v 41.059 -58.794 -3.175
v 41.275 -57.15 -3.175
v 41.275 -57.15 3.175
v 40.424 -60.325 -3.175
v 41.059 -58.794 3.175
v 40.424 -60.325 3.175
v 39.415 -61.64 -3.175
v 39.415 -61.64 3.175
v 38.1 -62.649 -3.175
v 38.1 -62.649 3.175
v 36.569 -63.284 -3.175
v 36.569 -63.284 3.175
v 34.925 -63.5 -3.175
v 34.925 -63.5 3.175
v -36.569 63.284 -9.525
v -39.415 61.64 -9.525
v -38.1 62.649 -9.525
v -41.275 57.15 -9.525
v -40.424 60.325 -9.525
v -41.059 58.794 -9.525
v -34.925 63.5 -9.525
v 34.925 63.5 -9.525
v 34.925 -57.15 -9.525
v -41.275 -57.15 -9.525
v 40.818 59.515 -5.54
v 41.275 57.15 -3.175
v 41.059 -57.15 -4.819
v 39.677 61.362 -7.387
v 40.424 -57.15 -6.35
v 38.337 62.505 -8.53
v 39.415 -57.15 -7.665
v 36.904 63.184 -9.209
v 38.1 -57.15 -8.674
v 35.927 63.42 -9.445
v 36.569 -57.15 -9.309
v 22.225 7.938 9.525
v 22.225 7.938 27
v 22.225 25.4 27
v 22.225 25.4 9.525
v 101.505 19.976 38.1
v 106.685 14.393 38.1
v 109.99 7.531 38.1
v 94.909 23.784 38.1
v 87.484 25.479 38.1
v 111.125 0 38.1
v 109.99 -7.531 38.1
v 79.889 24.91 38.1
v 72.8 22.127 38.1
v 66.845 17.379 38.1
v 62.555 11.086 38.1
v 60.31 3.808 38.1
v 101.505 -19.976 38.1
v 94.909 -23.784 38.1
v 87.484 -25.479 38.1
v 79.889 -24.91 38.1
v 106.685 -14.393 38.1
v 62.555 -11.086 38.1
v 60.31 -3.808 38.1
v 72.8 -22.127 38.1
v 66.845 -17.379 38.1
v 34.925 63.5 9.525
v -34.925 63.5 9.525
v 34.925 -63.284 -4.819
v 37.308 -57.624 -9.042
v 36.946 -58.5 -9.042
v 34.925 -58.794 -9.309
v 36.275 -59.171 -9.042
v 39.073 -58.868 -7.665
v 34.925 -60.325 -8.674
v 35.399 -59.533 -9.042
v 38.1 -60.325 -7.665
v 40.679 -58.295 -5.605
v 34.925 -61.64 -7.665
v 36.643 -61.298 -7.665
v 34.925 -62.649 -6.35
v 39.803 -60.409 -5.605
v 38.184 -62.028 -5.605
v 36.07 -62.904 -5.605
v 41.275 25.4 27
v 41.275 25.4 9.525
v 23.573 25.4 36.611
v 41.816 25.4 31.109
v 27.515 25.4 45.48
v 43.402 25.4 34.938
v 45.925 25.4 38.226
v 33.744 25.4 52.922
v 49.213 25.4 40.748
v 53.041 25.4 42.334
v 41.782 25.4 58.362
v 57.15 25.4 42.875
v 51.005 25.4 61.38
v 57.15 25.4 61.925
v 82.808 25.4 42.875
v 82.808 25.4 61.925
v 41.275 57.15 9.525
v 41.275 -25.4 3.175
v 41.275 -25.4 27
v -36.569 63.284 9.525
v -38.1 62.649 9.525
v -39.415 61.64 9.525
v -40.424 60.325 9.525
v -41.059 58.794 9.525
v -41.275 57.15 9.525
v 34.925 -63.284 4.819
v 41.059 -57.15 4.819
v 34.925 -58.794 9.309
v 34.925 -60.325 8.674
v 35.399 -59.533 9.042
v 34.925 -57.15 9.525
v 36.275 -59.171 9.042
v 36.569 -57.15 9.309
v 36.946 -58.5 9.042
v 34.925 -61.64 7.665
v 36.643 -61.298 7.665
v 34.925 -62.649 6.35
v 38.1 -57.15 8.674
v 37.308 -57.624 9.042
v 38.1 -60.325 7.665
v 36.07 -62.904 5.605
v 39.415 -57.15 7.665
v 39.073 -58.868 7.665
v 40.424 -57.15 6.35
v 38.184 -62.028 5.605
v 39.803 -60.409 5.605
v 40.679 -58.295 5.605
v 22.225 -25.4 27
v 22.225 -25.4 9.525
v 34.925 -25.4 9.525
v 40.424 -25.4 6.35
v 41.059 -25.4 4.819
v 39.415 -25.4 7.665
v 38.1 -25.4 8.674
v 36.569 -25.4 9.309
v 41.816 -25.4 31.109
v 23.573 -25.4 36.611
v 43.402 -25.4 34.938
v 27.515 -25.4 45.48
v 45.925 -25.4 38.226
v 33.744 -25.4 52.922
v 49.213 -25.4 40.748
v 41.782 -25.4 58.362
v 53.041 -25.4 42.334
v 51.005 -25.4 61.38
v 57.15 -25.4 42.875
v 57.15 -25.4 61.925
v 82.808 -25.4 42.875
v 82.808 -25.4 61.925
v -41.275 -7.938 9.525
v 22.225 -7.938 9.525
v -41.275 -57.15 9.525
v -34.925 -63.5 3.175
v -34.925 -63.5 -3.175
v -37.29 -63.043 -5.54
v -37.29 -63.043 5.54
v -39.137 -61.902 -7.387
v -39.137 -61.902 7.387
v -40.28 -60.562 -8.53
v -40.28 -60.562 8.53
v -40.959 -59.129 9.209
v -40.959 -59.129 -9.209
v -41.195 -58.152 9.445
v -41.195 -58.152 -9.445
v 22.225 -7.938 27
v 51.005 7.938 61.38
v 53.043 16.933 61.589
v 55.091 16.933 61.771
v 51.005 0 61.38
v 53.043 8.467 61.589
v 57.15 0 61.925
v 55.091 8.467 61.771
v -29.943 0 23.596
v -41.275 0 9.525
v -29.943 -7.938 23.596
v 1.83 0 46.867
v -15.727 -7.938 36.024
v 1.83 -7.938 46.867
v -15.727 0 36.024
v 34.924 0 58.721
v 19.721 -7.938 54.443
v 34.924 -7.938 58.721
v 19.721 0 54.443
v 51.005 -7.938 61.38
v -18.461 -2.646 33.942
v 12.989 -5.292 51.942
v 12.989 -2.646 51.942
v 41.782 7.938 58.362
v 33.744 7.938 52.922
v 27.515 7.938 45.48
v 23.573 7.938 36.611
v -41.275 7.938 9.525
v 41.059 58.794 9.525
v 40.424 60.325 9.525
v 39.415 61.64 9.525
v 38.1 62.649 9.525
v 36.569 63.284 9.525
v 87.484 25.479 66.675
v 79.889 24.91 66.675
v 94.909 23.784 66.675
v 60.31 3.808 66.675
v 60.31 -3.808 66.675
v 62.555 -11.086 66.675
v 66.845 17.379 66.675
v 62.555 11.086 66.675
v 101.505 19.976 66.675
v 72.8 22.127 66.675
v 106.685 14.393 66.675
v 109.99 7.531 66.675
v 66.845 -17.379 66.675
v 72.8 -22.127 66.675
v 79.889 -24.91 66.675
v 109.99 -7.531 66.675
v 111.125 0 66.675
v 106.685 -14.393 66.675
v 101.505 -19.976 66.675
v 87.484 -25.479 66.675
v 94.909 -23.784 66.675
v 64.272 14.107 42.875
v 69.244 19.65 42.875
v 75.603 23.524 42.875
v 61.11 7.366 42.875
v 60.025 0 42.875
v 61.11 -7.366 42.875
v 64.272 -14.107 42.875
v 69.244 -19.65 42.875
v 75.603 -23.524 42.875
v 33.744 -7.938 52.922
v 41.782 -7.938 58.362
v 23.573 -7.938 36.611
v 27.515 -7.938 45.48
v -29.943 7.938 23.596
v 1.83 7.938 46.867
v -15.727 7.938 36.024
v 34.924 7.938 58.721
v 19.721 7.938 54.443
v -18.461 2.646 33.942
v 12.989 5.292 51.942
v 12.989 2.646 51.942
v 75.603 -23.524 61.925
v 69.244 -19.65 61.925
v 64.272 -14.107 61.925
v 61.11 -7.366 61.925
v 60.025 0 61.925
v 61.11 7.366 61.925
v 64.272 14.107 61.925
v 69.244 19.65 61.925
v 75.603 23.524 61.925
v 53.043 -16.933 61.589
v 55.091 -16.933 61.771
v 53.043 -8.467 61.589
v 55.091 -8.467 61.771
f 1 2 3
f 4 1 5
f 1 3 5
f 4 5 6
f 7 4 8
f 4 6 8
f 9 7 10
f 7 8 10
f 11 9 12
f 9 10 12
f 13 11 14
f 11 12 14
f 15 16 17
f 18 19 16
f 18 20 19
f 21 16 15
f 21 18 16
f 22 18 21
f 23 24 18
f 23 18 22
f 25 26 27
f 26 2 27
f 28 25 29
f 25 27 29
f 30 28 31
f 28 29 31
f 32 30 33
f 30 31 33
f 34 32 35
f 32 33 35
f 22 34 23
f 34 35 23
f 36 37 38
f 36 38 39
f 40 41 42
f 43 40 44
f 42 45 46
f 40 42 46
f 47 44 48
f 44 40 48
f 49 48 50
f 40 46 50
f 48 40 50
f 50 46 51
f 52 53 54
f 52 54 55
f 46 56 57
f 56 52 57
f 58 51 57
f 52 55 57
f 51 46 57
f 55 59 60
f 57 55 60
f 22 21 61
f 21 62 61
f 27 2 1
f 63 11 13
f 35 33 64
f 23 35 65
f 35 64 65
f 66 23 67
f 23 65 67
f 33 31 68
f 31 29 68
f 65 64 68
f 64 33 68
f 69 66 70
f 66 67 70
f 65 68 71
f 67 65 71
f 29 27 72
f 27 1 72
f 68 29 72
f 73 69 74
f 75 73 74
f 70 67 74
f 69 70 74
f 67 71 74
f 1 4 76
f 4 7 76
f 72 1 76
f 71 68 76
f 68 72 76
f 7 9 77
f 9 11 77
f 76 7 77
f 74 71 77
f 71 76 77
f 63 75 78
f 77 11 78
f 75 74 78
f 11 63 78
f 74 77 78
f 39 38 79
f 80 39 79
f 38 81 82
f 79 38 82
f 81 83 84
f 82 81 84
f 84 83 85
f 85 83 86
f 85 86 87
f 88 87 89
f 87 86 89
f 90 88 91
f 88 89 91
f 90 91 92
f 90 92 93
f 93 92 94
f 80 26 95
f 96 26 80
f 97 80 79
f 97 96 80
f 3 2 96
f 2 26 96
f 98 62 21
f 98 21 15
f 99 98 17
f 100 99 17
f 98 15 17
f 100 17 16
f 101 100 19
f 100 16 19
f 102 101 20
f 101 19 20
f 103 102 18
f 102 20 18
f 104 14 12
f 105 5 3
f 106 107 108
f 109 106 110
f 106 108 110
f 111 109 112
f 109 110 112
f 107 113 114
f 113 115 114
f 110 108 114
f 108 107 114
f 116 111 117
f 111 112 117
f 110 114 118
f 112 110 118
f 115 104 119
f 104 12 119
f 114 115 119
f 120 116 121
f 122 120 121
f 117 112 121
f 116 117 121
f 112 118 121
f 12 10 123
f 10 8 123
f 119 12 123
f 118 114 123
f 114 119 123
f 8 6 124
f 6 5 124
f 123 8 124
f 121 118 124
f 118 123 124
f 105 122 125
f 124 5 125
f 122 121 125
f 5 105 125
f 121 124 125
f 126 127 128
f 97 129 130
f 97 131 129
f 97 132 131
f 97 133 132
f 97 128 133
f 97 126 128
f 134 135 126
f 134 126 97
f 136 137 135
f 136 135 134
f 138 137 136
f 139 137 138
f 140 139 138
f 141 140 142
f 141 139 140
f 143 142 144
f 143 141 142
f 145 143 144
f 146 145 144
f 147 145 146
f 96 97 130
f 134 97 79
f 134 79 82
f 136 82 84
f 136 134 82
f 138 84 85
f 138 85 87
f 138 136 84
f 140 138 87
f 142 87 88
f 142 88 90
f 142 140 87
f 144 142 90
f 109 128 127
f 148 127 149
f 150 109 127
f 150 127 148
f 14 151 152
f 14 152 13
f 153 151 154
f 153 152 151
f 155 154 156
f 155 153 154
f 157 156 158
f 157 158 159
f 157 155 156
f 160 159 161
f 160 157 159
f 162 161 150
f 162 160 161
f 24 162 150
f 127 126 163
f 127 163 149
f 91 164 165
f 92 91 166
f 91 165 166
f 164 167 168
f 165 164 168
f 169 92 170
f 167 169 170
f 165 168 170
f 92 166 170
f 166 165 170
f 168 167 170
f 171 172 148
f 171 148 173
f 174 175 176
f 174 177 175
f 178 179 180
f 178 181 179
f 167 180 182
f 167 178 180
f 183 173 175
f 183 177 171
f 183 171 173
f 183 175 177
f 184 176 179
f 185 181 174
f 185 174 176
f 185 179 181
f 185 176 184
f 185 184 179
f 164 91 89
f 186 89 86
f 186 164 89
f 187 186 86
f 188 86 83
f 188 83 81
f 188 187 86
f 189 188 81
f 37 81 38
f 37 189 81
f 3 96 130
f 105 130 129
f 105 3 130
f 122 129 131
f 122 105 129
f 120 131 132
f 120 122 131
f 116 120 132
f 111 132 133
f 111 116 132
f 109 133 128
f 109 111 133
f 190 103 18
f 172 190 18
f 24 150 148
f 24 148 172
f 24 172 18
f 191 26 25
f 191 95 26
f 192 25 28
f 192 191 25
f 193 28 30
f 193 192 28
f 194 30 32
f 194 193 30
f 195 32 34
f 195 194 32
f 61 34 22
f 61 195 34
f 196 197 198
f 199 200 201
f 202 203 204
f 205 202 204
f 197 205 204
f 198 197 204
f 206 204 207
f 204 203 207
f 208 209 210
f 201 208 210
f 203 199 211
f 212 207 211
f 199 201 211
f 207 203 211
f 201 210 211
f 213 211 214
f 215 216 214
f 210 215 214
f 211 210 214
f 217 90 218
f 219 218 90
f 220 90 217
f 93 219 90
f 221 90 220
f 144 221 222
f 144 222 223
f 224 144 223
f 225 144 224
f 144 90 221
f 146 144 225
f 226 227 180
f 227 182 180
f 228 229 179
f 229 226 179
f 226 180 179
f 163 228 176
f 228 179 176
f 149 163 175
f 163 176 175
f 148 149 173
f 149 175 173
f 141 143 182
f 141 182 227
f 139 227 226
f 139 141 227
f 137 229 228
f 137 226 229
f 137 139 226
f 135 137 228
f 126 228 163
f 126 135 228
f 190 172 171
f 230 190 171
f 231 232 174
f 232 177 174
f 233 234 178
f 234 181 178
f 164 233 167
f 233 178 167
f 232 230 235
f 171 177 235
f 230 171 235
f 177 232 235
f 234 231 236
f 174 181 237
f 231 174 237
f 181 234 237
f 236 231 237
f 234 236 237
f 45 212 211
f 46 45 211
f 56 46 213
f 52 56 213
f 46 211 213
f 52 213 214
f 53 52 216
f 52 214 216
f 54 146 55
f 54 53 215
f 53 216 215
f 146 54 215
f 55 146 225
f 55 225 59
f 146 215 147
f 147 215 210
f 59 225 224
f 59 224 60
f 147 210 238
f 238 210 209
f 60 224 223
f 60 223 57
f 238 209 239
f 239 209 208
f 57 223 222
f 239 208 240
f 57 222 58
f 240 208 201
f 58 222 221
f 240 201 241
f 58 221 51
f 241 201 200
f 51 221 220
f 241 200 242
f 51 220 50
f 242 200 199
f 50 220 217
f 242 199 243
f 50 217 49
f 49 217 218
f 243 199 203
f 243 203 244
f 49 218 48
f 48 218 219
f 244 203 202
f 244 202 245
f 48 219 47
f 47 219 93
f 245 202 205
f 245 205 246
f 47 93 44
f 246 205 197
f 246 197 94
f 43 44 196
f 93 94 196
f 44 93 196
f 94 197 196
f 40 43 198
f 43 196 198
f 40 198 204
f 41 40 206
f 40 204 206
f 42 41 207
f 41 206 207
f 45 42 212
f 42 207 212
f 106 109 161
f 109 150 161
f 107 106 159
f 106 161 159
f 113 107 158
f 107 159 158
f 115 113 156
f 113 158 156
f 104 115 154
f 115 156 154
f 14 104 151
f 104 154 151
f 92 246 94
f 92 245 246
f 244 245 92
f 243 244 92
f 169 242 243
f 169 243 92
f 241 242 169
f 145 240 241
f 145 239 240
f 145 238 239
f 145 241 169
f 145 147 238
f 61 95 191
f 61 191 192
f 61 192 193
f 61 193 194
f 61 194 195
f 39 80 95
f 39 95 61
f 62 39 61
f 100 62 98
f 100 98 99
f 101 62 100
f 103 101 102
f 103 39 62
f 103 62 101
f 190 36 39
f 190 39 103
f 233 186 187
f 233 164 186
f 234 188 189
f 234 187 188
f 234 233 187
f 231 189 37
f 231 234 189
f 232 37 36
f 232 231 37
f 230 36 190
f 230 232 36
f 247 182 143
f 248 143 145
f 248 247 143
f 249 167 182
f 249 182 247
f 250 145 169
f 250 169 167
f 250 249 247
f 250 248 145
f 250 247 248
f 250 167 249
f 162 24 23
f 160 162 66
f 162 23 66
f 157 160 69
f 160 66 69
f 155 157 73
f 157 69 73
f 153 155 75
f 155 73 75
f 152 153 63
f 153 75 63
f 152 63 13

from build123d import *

# Parameters (mm, degrees)
F1_DEPTH = 63.5
F2_DEPTH = 7.9375
F0_W     = 25.2498040683
F0_H     = 19.05
F3_DEPTH = 25.4
F5_R     = 6.35


# Not quite as in the source:
# - a feature names something its author has since deleted; it is built from what else it names


with BuildPart() as f1:
    # F0 (on Front) → F1 (new body, symmetric)
    with BuildSketch(Plane.XZ):
        Polygon((-41.275, -9.525), (41.275, -9.525), (41.275, 9.525), (22.225, 9.525), (-41.275, 9.525), align=None)
    extrude(amount=F1_DEPTH, both=True)

    # F0 (on Front) → F2 (join, symmetric)
    with BuildSketch(Plane.XZ):
        with BuildLine():
            add(Edge.make_bspline(
                [(-41.275, 9.525), (-23.4670489943, 36.4343195367), (10.3939996221, 56.9389145817), (51.0054120889, 61.3804219947)],
                knots=[0, 0, 0, 0, 106.1920094682, 106.1920094682, 106.1920094682, 106.1920094682], degree=3))
            Line((-41.275, 9.525), (22.225, 9.525))
            Line((22.225, 9.525), (22.225, 27.0002))
            ThreePointArc((22.225, 27.0002), (30.3698267575, 49.4184502908), (51.0054120889, 61.3804219947))
        make_face()
    extrude(amount=F2_DEPTH, both=True)

    # F0 (on Front) → F3 (join, symmetric)
    with BuildSketch(Plane.XZ):
        with BuildLine():
            Line((22.225, 9.525), (41.275, 9.525))
            Line((41.275, 9.525), (41.275, 27.0002))
            ThreePointArc((41.275, 27.0002), (45.9246798487, 38.2255201513), (57.15, 42.8752))
            Line((57.15, 42.8752), (60.325, 42.8752))
            Line((60.325, 42.8752), (60.325, 61.9252))
            Line((60.325, 61.9252), (57.15, 61.9252))
            add(Edge.make_bspline(
                [(51.0054120889, 61.3804219947), (53.0371017984, 61.6026197553), (55.0856860239, 61.7846155213), (57.15, 61.9252)],
                knots=[106.1920094682, 106.1920094682, 106.1920094682, 106.1920094682, 111.5045361635, 111.5045361635, 111.5045361635, 111.5045361635], degree=3))
            ThreePointArc((51.0054120889, 61.3804219947), (30.3698267575, 49.4184502908), (22.225, 27.0002))
            Line((22.225, 27.0002), (22.225, 9.525))
        make_face()
        with Locations((72.9499020342, 52.4002)):
            Rectangle(F0_W, F0_H)
    extrude(amount=F3_DEPTH, both=True)

    # F0 (on Front) → F4 (revolve)
    with BuildSketch(Plane.XZ):
        Polygon((85.5748040683, 61.9252), (85.5748040683, 42.8752), (85.5748040683, 38.1), (111.125, 38.1), (111.125, 66.675), (85.5748040683, 66.675), align=None)
    revolve(axis=Axis((85.5748040683, 0, 52.3875), (0, 0, -1)))

    # F5
    f5_edges = [f1.edges().sort_by_distance(p)[0] for p in [
        (41.275, -63.5, 0),
        (-41.275, -63.5, 0),
        (0, -63.5, 9.525),
        (41.275, 0, -9.525),
        (0, -63.5, -9.525),
        (41.275, -44.45, 9.525),
        (-41.275, 63.5, 0),
        (41.275, 63.5, 0),
    ]]
    fillet(f5_edges, radius=F5_R)


solid = f1.part
